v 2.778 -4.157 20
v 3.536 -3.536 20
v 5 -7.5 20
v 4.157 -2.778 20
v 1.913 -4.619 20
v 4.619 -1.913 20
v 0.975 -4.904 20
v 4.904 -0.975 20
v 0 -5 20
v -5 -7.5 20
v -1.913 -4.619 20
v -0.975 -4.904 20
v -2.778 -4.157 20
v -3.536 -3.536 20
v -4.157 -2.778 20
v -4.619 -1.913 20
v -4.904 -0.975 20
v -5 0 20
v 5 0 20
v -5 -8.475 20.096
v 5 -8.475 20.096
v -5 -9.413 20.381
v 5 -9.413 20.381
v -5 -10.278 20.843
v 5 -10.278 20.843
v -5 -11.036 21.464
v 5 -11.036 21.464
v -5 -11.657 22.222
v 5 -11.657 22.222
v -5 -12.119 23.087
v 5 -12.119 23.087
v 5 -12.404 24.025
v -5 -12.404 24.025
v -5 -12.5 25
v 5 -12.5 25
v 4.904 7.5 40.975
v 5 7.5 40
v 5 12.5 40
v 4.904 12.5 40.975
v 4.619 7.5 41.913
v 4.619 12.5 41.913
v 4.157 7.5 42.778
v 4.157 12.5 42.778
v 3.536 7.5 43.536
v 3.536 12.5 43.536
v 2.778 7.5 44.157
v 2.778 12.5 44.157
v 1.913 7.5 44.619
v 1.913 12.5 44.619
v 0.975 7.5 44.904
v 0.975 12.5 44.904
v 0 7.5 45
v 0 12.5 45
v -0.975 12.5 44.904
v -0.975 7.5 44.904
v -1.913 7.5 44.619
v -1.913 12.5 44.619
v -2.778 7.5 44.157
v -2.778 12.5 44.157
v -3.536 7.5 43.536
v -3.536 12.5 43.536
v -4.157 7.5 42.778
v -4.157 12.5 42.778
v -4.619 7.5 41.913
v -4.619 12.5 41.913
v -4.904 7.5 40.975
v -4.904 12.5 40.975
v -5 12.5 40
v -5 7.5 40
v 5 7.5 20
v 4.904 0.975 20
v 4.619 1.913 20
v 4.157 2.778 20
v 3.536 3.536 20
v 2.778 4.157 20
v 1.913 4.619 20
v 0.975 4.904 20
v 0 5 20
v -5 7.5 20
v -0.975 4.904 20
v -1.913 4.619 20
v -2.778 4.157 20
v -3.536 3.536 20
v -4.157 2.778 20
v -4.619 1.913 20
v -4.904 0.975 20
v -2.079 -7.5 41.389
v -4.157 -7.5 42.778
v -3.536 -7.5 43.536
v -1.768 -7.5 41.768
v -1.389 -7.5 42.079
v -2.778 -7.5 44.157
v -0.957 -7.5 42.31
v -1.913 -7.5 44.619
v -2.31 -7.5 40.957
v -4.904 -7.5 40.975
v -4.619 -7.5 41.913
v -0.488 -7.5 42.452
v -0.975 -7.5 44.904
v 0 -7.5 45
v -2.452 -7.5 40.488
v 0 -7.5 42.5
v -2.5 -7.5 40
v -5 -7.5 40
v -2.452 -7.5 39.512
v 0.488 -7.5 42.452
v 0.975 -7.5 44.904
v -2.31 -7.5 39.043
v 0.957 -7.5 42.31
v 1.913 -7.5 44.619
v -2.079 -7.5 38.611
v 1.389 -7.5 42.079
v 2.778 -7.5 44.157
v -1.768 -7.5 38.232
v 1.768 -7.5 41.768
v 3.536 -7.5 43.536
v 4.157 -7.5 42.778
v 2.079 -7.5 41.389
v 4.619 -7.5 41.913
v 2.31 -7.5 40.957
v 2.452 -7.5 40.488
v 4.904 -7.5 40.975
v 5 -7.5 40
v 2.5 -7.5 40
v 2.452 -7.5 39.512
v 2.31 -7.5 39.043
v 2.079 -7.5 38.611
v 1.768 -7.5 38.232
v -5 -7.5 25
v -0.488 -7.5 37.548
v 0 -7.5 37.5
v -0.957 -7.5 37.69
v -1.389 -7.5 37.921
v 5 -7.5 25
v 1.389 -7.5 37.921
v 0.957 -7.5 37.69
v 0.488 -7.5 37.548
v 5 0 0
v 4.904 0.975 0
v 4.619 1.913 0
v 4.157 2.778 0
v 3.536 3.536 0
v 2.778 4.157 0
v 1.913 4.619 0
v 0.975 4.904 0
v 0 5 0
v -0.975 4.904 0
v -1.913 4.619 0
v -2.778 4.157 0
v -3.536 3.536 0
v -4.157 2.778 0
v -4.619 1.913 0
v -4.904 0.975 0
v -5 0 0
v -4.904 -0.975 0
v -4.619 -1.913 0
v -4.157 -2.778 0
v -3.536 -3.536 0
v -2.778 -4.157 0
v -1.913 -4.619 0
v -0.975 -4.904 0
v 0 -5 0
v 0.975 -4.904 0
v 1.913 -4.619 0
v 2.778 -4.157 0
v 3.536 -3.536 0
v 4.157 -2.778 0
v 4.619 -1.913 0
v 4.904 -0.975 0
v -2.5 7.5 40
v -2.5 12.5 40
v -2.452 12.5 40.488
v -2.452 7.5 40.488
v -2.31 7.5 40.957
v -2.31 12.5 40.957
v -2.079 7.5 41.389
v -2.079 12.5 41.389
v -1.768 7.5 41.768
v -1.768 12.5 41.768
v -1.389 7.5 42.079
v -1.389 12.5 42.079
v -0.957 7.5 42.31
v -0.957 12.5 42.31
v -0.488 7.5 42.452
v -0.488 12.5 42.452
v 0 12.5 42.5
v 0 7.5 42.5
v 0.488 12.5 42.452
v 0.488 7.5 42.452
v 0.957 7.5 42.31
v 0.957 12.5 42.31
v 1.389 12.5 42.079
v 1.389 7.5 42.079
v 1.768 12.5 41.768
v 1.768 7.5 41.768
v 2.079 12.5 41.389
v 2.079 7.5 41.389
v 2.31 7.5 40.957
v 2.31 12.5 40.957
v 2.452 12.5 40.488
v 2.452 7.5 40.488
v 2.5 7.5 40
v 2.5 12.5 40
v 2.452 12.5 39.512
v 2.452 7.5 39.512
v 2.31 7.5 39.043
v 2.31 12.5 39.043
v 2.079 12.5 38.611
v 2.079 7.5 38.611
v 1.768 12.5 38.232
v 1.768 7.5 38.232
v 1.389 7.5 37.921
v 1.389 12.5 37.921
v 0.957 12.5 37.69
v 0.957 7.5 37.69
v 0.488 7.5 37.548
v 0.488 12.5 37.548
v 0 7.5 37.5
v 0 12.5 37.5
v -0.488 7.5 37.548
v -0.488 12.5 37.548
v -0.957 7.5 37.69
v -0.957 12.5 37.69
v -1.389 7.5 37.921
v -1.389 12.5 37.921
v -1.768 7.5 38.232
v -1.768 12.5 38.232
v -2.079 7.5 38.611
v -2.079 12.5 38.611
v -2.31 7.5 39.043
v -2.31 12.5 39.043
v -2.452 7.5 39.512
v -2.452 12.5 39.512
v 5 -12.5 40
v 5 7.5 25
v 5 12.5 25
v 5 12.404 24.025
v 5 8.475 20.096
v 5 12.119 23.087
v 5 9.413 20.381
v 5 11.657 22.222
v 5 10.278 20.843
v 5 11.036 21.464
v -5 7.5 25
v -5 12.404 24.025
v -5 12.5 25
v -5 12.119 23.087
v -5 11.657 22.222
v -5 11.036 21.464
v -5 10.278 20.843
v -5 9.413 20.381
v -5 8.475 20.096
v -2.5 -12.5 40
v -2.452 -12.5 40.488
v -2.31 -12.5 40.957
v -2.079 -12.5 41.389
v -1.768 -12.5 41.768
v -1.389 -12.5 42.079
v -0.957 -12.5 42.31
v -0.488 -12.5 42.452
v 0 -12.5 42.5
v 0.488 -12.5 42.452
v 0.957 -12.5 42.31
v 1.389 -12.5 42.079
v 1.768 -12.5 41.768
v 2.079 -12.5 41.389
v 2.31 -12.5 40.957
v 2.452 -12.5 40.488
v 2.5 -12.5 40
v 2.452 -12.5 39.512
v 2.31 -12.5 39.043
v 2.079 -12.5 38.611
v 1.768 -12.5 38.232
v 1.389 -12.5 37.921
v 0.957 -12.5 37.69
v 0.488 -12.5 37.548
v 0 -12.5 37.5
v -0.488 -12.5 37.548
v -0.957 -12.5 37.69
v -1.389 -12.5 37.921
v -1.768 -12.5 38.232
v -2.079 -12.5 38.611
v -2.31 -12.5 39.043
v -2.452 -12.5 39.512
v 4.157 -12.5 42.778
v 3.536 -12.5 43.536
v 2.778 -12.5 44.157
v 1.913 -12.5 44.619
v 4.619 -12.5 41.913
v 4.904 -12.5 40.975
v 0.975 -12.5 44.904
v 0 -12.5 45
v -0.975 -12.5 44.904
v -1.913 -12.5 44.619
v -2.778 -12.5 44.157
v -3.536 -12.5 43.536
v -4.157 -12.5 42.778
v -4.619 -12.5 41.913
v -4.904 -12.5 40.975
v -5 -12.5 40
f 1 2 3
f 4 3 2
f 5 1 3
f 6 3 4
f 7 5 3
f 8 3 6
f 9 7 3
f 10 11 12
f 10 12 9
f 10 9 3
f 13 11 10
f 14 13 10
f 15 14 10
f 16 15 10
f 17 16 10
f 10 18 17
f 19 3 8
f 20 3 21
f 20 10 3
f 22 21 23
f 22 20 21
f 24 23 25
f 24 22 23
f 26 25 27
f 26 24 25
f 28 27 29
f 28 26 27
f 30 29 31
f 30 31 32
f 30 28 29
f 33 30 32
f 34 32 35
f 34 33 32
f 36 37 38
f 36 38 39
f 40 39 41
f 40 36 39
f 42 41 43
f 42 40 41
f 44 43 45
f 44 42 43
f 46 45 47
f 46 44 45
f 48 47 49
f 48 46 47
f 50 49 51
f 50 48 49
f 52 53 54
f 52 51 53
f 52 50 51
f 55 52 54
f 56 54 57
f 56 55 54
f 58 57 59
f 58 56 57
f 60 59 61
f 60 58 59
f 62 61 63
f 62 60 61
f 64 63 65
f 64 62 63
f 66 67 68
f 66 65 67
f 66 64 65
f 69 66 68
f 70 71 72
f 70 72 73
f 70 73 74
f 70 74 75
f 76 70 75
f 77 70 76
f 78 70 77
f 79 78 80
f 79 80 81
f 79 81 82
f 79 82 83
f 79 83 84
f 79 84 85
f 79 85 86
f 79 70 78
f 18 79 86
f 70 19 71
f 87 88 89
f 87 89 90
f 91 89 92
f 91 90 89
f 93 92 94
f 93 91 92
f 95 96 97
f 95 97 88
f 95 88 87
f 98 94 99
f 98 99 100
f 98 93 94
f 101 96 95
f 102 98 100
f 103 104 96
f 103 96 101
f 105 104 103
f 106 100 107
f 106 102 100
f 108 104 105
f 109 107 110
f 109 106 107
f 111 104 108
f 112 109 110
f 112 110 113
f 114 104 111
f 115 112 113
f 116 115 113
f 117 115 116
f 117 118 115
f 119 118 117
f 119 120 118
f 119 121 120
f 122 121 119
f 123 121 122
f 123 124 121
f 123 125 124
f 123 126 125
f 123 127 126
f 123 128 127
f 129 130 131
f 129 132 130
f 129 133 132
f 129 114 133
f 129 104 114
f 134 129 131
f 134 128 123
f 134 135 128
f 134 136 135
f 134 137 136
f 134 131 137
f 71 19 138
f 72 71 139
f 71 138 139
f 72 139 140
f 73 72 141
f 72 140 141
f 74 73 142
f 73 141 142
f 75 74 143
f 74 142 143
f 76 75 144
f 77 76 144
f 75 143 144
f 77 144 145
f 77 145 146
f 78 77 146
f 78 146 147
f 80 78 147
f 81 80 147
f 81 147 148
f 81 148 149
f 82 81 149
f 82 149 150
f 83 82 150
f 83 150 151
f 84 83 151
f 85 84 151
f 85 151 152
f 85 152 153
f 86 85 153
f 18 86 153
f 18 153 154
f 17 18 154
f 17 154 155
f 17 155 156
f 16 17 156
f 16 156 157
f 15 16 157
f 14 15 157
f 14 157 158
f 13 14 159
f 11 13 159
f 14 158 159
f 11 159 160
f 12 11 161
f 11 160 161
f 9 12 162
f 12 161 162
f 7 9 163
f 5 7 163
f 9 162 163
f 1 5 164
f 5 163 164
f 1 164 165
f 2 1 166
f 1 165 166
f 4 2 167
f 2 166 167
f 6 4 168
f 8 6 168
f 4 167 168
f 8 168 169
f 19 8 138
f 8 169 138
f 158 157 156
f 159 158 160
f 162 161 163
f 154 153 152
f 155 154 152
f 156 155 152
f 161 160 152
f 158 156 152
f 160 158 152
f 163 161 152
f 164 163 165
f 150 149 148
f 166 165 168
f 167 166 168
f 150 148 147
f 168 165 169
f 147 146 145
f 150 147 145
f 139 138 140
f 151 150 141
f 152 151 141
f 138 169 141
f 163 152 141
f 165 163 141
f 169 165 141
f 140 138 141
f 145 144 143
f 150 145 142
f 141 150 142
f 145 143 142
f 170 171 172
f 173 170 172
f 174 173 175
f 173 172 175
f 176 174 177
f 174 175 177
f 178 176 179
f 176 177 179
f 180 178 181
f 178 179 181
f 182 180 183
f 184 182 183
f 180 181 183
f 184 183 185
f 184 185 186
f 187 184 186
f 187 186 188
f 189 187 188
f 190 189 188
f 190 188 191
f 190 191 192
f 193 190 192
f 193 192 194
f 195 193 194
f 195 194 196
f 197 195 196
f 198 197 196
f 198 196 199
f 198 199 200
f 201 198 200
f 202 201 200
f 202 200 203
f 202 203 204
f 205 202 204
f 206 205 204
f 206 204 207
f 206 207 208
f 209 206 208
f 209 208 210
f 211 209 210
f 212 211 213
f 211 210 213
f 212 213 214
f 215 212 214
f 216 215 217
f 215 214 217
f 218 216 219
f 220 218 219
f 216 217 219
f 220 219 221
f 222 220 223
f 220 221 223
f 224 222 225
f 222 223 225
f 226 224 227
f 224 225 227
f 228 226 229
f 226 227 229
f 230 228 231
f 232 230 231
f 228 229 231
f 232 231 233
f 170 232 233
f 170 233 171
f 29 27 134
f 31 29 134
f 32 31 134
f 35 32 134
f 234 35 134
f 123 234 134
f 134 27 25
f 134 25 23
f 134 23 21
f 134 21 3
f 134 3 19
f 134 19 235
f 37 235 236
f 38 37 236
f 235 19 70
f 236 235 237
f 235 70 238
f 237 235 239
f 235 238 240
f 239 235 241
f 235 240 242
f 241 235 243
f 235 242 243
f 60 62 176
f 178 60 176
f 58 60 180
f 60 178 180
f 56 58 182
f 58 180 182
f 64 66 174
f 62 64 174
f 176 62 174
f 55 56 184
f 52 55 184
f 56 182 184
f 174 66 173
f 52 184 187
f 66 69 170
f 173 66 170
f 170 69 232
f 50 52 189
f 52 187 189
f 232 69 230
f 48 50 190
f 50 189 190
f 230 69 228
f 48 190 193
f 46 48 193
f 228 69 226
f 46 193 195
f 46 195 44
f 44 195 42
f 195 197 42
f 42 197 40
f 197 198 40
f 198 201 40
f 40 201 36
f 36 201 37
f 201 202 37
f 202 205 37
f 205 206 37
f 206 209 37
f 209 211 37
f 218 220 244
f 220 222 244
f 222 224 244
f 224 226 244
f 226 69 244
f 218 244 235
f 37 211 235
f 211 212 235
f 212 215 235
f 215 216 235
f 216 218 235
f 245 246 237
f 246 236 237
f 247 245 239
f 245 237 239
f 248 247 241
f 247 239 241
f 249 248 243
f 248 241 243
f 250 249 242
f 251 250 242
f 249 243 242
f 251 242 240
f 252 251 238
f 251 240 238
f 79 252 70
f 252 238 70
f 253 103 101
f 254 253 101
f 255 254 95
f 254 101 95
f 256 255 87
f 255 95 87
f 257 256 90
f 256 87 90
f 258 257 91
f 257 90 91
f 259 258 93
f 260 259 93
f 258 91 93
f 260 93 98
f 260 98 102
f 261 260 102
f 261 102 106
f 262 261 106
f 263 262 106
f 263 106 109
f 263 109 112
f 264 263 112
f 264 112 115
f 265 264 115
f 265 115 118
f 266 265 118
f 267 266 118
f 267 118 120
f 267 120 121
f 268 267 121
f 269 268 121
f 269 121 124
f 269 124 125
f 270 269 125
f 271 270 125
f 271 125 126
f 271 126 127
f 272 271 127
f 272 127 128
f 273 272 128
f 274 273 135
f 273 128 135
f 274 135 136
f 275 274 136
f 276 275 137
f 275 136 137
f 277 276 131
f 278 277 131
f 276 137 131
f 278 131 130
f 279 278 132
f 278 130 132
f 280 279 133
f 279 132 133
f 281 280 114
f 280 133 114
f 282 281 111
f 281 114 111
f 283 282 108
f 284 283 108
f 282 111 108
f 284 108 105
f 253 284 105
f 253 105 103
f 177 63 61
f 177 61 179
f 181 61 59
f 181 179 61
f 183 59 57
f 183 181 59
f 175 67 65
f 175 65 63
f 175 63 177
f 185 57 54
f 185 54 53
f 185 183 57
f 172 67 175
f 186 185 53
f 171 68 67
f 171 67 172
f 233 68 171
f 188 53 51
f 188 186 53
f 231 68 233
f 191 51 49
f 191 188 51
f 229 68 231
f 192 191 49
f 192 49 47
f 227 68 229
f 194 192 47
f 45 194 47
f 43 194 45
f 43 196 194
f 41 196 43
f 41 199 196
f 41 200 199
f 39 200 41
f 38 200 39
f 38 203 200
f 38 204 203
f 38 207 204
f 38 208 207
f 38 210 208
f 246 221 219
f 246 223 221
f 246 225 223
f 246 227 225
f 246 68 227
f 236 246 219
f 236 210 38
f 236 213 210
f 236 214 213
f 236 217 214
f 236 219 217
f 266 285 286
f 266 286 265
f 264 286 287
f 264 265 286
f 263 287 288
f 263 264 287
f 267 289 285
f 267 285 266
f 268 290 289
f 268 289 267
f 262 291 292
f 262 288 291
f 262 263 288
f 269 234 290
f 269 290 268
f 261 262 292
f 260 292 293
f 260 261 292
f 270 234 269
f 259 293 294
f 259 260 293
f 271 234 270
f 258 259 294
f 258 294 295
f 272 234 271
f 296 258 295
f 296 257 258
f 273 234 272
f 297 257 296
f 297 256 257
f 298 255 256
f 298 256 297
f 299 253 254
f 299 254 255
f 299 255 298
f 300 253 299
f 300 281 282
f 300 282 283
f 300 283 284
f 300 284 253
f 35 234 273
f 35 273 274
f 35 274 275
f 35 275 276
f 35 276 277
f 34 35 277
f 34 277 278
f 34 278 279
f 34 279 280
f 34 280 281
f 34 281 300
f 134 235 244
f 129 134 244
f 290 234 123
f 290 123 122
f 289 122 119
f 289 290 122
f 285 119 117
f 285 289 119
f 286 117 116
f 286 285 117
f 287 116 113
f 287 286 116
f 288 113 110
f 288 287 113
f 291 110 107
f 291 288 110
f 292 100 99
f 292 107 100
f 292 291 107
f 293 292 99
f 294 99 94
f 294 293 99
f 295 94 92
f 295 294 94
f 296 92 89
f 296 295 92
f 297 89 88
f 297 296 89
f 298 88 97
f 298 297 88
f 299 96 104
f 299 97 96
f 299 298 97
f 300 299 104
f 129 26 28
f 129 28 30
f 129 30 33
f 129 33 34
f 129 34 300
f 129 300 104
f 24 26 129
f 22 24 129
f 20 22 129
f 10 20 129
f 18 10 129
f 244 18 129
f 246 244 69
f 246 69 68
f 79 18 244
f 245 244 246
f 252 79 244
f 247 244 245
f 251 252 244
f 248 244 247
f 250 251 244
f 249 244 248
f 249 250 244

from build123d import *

# Parameters (mm, degrees)
SKETCH1_R           = 5
BOSS_EXTRUDE1_DEPTH = 20
BOSS_EXTRUDE2_DEPTH = 5
SKETCH3_W           = 10
SKETCH3_H           = 5
BOSS_EXTRUDE3_DEPTH = 20
SKETCH4_R           = 2.5
CUT_EXTRUDE1_DEPTH  = 52.720402164
FILLET1_RADIUS      = 5
FILLET1_LENGTH      = 5
FILLET2_RADIUS      = 5
FILLET2_LENGTH      = 5
FILLET4_R           = 5
FILLET5_R           = 5


with BuildPart() as part:
    # Sketch1 → Boss-Extrude1 (new body)
    with BuildSketch(Plane.XY):
        Circle(SKETCH1_R)
    extrude(amount=BOSS_EXTRUDE1_DEPTH)

    # Sketch2 → Boss-Extrude2 (add)
    with BuildSketch(Plane.XY.offset(20)):
        Polygon((-5, 0), (-5, 12.5), (5, 12.5), (5, -12.5), (-5, -12.5), align=None)
    extrude(amount=BOSS_EXTRUDE2_DEPTH)

    # Sketch3 → Boss-Extrude3 (add)
    with BuildSketch(Plane.XY.offset(25)):
        with Locations((0, 10)):
            Rectangle(SKETCH3_W, SKETCH3_H)
        with Locations((0, -10)):
            Rectangle(SKETCH3_W, SKETCH3_H)
    extrude(amount=BOSS_EXTRUDE3_DEPTH)

    # Sketch4 → Cut-Extrude1 (cut, through all)
    with BuildSketch(Plane(origin=(0, 12.5, 0), x_dir=(1, 0, 0), z_dir=(0, 1, 0))):
        with Locations(Location((0, -40, 0), (0, 0, 180))):
            Circle(SKETCH4_R)
    extrude(amount=-CUT_EXTRUDE1_DEPTH, mode=Mode.SUBTRACT)

    # Fillet1: full round fillet: the end face becomes a half cylinder, R = half its width
    fillet1_face = Plane((0, 10, 45), x_dir=(0, -1, 0), z_dir=(0, 0, 1))  # on the end face: x along it, z out of the body
    fillet1_slab = fillet1_face.offset(-FILLET1_RADIUS / 2) * Box(FILLET1_LENGTH, 2 * FILLET1_RADIUS, FILLET1_RADIUS, mode=Mode.PRIVATE)  # the body's end, R deep
    fillet1_round = Plane((0, 10, 40), x_dir=(0, 0, 1), z_dir=(0, -1, 0)) * Cylinder(FILLET1_RADIUS, FILLET1_LENGTH, mode=Mode.PRIVATE)  # its axis R under the face
    add(fillet1_slab - fillet1_round, mode=Mode.SUBTRACT)

    # Fillet2: full round fillet: the end face becomes a half cylinder, R = half its width
    fillet2_face = Plane((0, -10, 45), x_dir=(0, -1, 0), z_dir=(0, 0, 1))  # on the end face: x along it, z out of the body
    fillet2_slab = fillet2_face.offset(-FILLET2_RADIUS / 2) * Box(FILLET2_LENGTH, 2 * FILLET2_RADIUS, FILLET2_RADIUS, mode=Mode.PRIVATE)  # the body's end, R deep
    fillet2_round = Plane((0, -10, 40), x_dir=(0, 0, 1), z_dir=(0, -1, 0)) * Cylinder(FILLET2_RADIUS, FILLET2_LENGTH, mode=Mode.PRIVATE)  # its axis R under the face
    add(fillet2_slab - fillet2_round, mode=Mode.SUBTRACT)

    # Fillet4
    fillet4_edges = [part.edges().sort_by_distance(p)[0] for p in [
        (0, 12.5, 20),
    ]]
    fillet(fillet4_edges, radius=FILLET4_R)

    # Fillet5
    fillet5_edges = [part.edges().sort_by_distance(p)[0] for p in [
        (0, -12.5, 20),
    ]]
    fillet(fillet5_edges, radius=FILLET5_R)


solid = part.part
